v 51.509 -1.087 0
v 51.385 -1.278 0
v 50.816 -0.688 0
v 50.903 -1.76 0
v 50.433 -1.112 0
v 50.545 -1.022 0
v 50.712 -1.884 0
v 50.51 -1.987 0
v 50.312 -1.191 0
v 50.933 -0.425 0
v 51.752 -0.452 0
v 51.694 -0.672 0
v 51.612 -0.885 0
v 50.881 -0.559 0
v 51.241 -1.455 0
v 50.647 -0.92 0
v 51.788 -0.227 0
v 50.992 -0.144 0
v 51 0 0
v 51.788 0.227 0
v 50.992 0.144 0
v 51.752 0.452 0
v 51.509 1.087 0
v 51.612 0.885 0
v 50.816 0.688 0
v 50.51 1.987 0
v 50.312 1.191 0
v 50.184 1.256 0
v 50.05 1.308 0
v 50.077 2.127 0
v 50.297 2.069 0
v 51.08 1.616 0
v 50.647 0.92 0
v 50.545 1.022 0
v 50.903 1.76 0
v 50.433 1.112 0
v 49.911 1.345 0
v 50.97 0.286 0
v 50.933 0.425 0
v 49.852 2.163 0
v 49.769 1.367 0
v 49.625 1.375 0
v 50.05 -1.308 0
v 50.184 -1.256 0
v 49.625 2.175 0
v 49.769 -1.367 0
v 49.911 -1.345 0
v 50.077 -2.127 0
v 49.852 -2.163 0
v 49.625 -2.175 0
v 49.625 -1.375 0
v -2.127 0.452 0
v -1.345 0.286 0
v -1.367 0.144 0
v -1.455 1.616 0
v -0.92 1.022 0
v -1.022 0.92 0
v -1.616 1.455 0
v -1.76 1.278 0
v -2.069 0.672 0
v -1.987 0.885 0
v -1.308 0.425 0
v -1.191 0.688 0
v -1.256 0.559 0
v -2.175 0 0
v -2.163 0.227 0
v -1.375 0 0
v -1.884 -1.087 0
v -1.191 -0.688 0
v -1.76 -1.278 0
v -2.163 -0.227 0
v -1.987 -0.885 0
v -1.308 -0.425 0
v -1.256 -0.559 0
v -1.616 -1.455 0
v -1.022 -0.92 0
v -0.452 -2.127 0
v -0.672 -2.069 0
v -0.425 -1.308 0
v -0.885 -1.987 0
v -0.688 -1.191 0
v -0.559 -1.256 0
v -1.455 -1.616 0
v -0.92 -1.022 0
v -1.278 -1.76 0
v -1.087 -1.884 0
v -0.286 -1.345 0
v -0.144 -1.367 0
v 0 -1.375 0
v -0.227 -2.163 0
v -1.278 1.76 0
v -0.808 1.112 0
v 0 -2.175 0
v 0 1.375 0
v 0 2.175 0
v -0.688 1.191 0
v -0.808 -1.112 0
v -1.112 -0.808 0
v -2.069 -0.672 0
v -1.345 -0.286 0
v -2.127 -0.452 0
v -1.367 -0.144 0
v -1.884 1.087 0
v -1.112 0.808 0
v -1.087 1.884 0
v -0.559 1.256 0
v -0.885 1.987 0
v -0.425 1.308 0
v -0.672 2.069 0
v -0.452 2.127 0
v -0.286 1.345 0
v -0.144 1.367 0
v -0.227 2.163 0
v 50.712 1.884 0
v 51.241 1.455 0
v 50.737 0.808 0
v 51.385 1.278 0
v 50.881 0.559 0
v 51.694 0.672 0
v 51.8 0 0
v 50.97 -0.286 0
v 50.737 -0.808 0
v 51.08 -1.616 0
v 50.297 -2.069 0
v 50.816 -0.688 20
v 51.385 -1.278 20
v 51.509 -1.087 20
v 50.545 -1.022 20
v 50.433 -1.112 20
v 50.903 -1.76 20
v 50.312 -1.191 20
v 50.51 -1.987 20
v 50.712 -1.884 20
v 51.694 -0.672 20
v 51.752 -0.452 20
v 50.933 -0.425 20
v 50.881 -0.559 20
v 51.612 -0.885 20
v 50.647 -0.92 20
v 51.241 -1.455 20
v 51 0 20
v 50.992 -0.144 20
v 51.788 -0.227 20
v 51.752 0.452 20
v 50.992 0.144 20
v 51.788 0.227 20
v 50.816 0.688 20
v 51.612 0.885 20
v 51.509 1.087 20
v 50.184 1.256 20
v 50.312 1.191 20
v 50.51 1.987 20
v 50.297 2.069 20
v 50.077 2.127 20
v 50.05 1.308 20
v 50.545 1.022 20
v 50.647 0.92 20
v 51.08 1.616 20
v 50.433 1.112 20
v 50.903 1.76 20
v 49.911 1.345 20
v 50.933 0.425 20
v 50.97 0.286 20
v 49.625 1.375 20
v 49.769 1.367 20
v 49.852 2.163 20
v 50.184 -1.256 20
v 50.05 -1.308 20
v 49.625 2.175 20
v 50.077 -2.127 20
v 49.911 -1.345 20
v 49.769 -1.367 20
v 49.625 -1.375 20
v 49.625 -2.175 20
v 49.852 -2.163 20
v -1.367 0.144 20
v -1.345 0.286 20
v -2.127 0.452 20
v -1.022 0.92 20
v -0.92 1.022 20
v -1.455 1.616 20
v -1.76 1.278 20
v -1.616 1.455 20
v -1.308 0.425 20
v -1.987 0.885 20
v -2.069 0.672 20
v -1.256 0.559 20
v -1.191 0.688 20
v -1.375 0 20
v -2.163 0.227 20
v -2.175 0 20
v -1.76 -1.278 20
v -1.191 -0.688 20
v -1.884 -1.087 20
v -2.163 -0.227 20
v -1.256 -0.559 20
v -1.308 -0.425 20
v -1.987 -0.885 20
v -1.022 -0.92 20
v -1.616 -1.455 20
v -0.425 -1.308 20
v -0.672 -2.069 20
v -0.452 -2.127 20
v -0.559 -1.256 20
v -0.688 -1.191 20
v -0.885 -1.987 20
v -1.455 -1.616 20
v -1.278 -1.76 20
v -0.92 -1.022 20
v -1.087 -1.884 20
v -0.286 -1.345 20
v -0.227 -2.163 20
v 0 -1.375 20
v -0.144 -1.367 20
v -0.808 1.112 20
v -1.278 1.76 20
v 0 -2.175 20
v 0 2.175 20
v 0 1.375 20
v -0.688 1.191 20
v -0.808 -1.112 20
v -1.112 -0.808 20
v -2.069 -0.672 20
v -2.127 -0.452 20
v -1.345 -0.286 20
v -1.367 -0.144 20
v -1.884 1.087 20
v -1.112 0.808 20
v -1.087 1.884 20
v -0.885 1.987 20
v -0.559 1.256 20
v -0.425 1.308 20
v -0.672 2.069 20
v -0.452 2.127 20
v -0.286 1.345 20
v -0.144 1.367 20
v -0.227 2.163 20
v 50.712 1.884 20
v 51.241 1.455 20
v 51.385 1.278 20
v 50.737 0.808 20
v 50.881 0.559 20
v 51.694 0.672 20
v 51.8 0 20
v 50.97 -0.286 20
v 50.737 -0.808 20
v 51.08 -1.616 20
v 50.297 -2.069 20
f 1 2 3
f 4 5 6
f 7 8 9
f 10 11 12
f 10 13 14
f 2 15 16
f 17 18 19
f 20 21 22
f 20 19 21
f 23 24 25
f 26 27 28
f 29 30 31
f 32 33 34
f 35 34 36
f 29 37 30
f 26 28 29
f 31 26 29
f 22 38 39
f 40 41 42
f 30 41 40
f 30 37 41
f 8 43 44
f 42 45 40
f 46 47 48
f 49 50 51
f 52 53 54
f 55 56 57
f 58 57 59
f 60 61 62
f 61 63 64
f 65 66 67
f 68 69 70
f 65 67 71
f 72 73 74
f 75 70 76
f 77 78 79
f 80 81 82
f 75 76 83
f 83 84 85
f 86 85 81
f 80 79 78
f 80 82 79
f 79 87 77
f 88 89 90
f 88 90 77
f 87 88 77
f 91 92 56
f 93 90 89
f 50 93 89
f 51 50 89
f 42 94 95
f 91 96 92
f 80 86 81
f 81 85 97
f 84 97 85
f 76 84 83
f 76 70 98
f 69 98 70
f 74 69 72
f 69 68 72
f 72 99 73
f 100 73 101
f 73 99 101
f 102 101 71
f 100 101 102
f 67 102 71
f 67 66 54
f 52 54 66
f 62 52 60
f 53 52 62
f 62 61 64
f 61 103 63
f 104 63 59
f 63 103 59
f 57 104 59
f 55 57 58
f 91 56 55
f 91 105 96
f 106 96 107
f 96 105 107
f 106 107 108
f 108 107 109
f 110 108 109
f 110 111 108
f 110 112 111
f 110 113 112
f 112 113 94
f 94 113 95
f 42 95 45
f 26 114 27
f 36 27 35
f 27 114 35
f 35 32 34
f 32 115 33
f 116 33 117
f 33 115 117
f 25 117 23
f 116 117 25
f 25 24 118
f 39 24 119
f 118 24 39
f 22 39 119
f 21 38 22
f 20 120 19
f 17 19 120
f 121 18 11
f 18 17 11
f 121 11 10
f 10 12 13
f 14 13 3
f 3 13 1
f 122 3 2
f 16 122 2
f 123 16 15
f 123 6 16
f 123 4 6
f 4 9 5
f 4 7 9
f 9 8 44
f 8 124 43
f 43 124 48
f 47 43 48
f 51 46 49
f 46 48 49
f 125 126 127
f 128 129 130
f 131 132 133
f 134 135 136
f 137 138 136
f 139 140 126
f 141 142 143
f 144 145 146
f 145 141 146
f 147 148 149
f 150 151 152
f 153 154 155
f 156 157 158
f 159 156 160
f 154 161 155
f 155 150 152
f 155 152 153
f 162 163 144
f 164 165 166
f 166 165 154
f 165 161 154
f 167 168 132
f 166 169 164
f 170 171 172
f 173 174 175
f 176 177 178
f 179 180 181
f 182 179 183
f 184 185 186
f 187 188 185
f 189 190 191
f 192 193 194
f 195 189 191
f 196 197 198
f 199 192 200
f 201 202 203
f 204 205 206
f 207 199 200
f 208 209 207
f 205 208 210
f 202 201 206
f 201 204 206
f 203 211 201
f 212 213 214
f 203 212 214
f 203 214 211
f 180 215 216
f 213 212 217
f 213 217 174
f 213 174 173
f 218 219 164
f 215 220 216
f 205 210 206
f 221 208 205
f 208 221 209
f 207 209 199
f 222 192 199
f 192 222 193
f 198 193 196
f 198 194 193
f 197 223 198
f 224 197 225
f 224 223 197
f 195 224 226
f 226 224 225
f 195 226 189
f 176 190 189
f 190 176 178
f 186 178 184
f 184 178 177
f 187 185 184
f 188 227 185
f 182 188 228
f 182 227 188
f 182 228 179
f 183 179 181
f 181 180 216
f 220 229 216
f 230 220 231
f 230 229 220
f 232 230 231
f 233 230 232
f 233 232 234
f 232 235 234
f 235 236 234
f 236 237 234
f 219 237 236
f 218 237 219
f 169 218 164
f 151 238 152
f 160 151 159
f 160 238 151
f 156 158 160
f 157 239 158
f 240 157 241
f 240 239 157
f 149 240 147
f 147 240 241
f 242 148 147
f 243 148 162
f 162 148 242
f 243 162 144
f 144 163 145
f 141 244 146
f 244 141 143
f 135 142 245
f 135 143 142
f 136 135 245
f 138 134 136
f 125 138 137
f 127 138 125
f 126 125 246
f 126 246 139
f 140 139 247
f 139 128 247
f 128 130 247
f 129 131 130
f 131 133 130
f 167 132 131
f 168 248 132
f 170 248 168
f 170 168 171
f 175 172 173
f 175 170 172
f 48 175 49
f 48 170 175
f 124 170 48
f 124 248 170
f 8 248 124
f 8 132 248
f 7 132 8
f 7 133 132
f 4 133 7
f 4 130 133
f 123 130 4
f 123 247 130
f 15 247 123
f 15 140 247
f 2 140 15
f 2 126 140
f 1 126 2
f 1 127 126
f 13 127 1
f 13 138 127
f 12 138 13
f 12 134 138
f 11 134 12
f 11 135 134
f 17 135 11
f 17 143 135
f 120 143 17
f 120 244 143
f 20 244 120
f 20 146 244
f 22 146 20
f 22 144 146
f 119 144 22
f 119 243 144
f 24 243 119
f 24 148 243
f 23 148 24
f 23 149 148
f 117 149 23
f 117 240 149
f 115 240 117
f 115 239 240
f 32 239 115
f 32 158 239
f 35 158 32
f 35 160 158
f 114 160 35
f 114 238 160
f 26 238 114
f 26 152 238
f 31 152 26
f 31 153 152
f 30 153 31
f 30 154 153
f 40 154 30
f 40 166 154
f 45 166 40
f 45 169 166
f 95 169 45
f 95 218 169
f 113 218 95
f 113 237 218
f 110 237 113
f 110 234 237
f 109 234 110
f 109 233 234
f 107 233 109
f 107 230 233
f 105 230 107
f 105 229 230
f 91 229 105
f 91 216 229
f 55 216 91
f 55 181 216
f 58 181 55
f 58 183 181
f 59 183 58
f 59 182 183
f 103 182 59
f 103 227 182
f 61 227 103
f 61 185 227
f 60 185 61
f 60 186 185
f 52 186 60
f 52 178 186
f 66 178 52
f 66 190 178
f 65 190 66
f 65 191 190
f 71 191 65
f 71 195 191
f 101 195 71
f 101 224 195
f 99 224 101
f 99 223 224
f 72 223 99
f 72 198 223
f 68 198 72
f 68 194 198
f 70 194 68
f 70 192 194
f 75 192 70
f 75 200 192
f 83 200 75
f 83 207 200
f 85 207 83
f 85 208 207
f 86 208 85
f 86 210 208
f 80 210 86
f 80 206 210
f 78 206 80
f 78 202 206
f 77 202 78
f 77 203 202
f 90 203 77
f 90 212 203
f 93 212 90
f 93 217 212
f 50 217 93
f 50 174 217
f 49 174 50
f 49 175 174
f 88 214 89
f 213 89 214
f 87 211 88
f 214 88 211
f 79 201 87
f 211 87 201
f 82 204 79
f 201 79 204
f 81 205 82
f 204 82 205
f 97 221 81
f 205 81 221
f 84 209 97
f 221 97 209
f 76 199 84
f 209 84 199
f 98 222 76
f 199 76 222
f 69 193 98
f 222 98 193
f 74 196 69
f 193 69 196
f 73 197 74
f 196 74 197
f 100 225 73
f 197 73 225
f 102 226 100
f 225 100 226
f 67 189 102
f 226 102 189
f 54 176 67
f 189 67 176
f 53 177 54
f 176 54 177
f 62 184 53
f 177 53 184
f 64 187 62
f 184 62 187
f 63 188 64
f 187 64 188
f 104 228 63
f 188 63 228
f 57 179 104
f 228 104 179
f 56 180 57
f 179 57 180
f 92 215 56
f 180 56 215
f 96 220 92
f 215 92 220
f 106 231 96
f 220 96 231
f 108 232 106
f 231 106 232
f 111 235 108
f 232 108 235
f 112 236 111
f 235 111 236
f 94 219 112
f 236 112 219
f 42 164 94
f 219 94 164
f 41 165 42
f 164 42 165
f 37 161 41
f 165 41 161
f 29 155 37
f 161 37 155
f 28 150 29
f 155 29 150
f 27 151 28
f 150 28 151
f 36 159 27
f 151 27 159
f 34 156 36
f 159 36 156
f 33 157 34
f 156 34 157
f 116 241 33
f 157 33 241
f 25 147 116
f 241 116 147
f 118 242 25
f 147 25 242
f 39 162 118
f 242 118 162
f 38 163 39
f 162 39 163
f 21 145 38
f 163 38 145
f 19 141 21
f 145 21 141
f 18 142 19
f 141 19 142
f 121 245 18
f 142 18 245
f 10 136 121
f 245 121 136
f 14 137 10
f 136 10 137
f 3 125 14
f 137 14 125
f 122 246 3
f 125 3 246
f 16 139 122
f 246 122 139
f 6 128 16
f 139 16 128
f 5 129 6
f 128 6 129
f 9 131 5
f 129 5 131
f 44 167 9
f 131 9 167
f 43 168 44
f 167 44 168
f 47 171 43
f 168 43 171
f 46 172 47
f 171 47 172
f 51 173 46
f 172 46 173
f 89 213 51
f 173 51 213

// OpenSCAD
/*
* Blind_Slat_Sleeve.scad
*
* Project: Joining sleeve for fixing blind slats
* Copyright (c) 2016 Shelby Merrick
* http://www.forkineye.com
*
*  This program is provided free for you to use in any way that you wish,
*  subject to the laws and regulations where you are using it.  Due diligence
*  is strongly suggested before using this code.  Please give credit where due.
*
*  The Author makes no warranty of any kind, express or implied, with regard
*  to this program or the documentation contained in this document.  The
*  Author shall not be liable in any event for incidental or consequential
*  damages in connection with, or arising out of, the furnishing, performance
*  or use of these programs.
*
*/

/******************************/
/***** USER CONFIGURATION *****/
/******************************/

blind_width = 51;       // Width of blind
blind_thickness = 2.75; // Thickness of blind
sleeve_width = 20;      // Width of sleeve    
sleeve_thickness = .8;  // Wall thickness of sleeve



/*************************************/
/***** END OF USER CONFIGURATION *****/
/*************************************/

// Globals - Don't change
$fn = 60;
radius = blind_thickness / 2;
width = blind_width - radius;

linear_extrude(height = sleeve_width) {
    difference() {
        hull() {
            circle(radius + sleeve_thickness);
            translate([width,0,0]) circle(radius + sleeve_thickness);
        }

        hull() {
            circle(radius);
            translate([width,0,0]) circle(radius);
        }
    }
}
